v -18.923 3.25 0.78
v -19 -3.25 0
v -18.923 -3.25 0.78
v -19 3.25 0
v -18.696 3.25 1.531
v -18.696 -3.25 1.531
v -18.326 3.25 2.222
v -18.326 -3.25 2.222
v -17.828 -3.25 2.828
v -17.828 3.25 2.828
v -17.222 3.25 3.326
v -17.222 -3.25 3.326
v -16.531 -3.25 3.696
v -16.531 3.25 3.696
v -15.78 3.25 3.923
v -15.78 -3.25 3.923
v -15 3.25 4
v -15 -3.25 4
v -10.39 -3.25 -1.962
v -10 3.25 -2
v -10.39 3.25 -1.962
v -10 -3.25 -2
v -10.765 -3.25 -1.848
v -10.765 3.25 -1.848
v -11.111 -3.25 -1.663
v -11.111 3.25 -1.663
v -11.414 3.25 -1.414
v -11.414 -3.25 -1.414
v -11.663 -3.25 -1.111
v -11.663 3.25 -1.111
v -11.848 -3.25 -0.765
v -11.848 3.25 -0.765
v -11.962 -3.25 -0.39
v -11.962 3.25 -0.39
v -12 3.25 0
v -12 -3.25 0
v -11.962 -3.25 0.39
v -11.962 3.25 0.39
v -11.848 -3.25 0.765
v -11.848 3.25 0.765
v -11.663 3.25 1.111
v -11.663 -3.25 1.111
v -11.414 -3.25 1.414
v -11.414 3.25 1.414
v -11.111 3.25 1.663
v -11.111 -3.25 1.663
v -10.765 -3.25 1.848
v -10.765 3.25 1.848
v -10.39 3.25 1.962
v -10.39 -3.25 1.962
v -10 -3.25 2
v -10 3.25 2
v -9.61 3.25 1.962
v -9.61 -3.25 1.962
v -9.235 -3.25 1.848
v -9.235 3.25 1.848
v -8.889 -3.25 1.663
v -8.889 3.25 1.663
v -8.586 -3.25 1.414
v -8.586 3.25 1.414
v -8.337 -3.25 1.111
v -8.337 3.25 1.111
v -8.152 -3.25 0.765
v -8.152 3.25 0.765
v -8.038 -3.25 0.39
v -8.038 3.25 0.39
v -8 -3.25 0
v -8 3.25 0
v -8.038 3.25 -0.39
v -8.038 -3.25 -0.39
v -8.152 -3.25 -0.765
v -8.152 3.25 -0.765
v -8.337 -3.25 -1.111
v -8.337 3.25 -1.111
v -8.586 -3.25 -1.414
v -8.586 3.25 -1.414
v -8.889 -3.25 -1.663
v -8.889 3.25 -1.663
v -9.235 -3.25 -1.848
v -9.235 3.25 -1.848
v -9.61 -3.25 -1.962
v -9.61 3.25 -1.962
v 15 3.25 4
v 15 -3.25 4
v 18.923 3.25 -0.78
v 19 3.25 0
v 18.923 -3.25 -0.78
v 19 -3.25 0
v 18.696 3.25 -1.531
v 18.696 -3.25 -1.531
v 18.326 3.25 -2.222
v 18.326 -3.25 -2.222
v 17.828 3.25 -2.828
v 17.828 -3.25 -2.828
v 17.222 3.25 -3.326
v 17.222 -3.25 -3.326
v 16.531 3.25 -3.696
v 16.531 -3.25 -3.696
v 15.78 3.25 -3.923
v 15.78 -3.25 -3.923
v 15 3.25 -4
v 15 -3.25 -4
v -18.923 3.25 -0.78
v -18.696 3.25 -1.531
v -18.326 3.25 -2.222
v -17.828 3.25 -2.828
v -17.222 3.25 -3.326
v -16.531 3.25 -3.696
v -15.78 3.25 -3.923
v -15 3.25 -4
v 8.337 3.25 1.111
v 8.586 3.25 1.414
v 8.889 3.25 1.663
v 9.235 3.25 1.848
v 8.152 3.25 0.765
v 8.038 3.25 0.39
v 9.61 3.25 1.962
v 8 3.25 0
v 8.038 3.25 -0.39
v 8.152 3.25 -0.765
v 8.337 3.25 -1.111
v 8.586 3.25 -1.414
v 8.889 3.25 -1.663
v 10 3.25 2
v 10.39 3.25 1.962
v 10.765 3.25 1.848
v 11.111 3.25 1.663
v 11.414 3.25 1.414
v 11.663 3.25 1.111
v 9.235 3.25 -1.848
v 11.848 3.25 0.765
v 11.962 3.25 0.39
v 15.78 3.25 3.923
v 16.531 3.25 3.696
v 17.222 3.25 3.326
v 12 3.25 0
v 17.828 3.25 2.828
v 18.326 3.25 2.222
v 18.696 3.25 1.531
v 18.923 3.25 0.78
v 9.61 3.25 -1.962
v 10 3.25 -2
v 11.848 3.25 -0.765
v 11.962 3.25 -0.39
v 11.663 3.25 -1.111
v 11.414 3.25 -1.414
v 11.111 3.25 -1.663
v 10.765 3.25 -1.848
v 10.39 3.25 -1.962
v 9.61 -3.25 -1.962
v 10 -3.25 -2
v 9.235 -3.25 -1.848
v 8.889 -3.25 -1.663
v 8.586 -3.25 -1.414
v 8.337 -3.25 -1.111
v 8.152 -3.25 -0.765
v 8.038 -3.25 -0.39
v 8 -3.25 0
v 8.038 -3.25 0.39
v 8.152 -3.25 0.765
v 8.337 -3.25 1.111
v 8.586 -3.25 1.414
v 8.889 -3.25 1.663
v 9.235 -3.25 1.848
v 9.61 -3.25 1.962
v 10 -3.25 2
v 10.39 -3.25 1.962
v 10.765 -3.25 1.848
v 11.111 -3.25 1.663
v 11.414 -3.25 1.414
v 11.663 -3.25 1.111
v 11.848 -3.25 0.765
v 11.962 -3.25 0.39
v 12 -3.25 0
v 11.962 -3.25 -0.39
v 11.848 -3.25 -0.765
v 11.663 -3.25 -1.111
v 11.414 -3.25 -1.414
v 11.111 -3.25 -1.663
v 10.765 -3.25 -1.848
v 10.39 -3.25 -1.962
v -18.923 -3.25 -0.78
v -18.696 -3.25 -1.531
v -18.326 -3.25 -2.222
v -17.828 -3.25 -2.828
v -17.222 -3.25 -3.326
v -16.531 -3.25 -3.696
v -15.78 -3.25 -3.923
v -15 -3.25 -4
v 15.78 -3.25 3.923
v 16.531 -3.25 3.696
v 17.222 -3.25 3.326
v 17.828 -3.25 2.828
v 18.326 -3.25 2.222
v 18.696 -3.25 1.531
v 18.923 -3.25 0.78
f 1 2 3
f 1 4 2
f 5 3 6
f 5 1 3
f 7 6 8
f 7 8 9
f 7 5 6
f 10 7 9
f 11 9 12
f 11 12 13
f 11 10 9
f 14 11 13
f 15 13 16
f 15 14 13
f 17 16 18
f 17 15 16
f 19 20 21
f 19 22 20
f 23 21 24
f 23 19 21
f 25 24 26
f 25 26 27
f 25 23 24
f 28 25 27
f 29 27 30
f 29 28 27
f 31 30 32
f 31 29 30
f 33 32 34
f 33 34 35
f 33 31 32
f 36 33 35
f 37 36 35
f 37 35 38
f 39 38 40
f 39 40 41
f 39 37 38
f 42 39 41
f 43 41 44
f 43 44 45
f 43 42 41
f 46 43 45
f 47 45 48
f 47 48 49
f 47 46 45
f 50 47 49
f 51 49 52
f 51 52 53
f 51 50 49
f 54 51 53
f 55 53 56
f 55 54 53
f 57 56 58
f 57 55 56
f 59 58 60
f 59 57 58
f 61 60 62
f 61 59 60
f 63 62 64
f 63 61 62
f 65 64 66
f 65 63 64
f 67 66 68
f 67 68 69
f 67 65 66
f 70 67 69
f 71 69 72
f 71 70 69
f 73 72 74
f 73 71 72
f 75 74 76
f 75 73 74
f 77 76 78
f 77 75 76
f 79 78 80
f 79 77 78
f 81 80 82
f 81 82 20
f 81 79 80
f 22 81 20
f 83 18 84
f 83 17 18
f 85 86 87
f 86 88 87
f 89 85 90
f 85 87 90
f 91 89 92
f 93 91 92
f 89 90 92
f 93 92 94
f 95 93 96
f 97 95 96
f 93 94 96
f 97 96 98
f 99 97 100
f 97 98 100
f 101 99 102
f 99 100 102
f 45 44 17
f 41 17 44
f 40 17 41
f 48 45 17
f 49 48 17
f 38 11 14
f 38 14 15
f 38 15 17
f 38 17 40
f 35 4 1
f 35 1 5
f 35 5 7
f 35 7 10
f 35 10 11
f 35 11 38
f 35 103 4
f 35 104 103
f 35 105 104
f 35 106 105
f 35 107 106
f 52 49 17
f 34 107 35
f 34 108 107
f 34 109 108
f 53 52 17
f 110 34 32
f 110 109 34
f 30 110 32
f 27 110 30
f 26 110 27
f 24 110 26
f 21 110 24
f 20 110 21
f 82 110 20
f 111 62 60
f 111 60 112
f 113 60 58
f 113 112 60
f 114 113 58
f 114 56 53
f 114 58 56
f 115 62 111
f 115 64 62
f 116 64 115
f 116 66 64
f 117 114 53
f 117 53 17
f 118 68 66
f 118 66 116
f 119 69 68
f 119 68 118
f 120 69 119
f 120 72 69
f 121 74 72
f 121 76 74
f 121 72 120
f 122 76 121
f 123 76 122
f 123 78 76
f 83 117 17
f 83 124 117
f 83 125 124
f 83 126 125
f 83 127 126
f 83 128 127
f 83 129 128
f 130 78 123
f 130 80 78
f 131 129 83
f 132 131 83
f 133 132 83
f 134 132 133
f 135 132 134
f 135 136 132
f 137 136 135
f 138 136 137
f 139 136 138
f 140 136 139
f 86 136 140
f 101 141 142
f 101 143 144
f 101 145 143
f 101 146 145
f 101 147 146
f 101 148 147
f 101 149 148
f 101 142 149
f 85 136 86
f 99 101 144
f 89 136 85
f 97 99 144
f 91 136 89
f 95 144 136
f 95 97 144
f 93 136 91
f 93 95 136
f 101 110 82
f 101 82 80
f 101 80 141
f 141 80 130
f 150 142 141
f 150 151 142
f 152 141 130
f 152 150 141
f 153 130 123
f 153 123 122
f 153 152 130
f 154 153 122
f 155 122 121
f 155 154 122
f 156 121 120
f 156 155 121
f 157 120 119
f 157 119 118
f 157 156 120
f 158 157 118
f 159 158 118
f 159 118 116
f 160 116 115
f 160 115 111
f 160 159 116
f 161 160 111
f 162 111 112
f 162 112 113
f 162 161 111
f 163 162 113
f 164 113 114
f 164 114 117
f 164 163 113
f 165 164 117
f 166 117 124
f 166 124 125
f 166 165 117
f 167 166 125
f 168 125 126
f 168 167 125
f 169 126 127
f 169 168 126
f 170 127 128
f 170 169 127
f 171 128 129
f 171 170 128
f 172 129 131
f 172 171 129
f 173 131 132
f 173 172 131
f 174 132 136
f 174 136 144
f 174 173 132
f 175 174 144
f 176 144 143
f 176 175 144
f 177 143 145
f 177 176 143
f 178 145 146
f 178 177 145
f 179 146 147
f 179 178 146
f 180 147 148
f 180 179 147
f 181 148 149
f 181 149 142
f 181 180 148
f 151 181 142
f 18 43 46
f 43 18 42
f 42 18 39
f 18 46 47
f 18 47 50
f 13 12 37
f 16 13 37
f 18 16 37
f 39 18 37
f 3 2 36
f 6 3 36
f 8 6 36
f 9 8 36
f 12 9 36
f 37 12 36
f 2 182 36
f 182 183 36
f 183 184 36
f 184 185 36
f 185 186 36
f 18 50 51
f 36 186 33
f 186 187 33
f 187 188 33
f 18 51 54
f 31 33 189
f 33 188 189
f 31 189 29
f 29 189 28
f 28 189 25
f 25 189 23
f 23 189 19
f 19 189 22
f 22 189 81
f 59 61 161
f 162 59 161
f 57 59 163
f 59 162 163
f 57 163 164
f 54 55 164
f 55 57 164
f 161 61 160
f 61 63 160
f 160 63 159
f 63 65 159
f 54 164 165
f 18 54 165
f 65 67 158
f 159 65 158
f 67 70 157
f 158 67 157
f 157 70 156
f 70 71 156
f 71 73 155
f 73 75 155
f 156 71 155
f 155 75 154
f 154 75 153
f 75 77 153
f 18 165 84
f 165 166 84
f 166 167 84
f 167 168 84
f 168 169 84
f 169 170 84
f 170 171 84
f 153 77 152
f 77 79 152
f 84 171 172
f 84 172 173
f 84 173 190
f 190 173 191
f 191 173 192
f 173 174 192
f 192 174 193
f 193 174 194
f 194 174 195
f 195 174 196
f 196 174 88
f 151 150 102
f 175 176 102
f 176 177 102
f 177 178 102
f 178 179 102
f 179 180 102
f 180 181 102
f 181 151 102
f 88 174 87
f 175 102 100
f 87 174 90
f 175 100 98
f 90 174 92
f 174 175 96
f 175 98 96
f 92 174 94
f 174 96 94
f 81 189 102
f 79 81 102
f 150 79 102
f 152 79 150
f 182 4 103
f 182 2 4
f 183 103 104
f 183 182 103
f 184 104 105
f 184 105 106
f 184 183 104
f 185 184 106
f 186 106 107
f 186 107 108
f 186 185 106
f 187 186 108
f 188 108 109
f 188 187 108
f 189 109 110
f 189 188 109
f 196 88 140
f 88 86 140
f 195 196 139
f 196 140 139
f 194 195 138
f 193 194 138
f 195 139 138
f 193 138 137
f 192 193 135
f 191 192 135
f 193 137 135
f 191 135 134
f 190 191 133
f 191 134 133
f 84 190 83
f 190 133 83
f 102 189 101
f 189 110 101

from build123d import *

# Parameters (mm, degrees)
ESBO_O1_W                = 38
ESBO_O1_H                = 8
ESBO_O1_R                = 2
RESSALTO_EXTRUS_O1_DEPTH = 3.25
FILETE1_R                = 4


with BuildPart() as part:
    # Esboço1 → Ressalto-extrusão1 (new, symmetric)
    with BuildSketch(Plane(origin=(0, 0, 0), x_dir=(1, 0, 0), z_dir=(0, 1, 0))):
        Rectangle(ESBO_O1_W, ESBO_O1_H)
        with Locations(Location((-10, 0, 0), (0, 0, 90))):
            Circle(ESBO_O1_R, mode=Mode.SUBTRACT)
        with Locations(Location((10, 0, 0), (0, 0, 90))):
            Circle(ESBO_O1_R, mode=Mode.SUBTRACT)
    extrude(amount=RESSALTO_EXTRUS_O1_DEPTH, both=True)

    # Filete1
    filete1_edges = [part.edges().sort_by_distance(p)[0] for p in [
        (-19, 0, 4),
        (-19, 0, -4),
        (19, 0, -4),
        (19, 0, 4),
    ]]
    fillet(filete1_edges, radius=FILETE1_R - 0.0001)  # a hair under: the kernel refuses the full size


solid = part.part
